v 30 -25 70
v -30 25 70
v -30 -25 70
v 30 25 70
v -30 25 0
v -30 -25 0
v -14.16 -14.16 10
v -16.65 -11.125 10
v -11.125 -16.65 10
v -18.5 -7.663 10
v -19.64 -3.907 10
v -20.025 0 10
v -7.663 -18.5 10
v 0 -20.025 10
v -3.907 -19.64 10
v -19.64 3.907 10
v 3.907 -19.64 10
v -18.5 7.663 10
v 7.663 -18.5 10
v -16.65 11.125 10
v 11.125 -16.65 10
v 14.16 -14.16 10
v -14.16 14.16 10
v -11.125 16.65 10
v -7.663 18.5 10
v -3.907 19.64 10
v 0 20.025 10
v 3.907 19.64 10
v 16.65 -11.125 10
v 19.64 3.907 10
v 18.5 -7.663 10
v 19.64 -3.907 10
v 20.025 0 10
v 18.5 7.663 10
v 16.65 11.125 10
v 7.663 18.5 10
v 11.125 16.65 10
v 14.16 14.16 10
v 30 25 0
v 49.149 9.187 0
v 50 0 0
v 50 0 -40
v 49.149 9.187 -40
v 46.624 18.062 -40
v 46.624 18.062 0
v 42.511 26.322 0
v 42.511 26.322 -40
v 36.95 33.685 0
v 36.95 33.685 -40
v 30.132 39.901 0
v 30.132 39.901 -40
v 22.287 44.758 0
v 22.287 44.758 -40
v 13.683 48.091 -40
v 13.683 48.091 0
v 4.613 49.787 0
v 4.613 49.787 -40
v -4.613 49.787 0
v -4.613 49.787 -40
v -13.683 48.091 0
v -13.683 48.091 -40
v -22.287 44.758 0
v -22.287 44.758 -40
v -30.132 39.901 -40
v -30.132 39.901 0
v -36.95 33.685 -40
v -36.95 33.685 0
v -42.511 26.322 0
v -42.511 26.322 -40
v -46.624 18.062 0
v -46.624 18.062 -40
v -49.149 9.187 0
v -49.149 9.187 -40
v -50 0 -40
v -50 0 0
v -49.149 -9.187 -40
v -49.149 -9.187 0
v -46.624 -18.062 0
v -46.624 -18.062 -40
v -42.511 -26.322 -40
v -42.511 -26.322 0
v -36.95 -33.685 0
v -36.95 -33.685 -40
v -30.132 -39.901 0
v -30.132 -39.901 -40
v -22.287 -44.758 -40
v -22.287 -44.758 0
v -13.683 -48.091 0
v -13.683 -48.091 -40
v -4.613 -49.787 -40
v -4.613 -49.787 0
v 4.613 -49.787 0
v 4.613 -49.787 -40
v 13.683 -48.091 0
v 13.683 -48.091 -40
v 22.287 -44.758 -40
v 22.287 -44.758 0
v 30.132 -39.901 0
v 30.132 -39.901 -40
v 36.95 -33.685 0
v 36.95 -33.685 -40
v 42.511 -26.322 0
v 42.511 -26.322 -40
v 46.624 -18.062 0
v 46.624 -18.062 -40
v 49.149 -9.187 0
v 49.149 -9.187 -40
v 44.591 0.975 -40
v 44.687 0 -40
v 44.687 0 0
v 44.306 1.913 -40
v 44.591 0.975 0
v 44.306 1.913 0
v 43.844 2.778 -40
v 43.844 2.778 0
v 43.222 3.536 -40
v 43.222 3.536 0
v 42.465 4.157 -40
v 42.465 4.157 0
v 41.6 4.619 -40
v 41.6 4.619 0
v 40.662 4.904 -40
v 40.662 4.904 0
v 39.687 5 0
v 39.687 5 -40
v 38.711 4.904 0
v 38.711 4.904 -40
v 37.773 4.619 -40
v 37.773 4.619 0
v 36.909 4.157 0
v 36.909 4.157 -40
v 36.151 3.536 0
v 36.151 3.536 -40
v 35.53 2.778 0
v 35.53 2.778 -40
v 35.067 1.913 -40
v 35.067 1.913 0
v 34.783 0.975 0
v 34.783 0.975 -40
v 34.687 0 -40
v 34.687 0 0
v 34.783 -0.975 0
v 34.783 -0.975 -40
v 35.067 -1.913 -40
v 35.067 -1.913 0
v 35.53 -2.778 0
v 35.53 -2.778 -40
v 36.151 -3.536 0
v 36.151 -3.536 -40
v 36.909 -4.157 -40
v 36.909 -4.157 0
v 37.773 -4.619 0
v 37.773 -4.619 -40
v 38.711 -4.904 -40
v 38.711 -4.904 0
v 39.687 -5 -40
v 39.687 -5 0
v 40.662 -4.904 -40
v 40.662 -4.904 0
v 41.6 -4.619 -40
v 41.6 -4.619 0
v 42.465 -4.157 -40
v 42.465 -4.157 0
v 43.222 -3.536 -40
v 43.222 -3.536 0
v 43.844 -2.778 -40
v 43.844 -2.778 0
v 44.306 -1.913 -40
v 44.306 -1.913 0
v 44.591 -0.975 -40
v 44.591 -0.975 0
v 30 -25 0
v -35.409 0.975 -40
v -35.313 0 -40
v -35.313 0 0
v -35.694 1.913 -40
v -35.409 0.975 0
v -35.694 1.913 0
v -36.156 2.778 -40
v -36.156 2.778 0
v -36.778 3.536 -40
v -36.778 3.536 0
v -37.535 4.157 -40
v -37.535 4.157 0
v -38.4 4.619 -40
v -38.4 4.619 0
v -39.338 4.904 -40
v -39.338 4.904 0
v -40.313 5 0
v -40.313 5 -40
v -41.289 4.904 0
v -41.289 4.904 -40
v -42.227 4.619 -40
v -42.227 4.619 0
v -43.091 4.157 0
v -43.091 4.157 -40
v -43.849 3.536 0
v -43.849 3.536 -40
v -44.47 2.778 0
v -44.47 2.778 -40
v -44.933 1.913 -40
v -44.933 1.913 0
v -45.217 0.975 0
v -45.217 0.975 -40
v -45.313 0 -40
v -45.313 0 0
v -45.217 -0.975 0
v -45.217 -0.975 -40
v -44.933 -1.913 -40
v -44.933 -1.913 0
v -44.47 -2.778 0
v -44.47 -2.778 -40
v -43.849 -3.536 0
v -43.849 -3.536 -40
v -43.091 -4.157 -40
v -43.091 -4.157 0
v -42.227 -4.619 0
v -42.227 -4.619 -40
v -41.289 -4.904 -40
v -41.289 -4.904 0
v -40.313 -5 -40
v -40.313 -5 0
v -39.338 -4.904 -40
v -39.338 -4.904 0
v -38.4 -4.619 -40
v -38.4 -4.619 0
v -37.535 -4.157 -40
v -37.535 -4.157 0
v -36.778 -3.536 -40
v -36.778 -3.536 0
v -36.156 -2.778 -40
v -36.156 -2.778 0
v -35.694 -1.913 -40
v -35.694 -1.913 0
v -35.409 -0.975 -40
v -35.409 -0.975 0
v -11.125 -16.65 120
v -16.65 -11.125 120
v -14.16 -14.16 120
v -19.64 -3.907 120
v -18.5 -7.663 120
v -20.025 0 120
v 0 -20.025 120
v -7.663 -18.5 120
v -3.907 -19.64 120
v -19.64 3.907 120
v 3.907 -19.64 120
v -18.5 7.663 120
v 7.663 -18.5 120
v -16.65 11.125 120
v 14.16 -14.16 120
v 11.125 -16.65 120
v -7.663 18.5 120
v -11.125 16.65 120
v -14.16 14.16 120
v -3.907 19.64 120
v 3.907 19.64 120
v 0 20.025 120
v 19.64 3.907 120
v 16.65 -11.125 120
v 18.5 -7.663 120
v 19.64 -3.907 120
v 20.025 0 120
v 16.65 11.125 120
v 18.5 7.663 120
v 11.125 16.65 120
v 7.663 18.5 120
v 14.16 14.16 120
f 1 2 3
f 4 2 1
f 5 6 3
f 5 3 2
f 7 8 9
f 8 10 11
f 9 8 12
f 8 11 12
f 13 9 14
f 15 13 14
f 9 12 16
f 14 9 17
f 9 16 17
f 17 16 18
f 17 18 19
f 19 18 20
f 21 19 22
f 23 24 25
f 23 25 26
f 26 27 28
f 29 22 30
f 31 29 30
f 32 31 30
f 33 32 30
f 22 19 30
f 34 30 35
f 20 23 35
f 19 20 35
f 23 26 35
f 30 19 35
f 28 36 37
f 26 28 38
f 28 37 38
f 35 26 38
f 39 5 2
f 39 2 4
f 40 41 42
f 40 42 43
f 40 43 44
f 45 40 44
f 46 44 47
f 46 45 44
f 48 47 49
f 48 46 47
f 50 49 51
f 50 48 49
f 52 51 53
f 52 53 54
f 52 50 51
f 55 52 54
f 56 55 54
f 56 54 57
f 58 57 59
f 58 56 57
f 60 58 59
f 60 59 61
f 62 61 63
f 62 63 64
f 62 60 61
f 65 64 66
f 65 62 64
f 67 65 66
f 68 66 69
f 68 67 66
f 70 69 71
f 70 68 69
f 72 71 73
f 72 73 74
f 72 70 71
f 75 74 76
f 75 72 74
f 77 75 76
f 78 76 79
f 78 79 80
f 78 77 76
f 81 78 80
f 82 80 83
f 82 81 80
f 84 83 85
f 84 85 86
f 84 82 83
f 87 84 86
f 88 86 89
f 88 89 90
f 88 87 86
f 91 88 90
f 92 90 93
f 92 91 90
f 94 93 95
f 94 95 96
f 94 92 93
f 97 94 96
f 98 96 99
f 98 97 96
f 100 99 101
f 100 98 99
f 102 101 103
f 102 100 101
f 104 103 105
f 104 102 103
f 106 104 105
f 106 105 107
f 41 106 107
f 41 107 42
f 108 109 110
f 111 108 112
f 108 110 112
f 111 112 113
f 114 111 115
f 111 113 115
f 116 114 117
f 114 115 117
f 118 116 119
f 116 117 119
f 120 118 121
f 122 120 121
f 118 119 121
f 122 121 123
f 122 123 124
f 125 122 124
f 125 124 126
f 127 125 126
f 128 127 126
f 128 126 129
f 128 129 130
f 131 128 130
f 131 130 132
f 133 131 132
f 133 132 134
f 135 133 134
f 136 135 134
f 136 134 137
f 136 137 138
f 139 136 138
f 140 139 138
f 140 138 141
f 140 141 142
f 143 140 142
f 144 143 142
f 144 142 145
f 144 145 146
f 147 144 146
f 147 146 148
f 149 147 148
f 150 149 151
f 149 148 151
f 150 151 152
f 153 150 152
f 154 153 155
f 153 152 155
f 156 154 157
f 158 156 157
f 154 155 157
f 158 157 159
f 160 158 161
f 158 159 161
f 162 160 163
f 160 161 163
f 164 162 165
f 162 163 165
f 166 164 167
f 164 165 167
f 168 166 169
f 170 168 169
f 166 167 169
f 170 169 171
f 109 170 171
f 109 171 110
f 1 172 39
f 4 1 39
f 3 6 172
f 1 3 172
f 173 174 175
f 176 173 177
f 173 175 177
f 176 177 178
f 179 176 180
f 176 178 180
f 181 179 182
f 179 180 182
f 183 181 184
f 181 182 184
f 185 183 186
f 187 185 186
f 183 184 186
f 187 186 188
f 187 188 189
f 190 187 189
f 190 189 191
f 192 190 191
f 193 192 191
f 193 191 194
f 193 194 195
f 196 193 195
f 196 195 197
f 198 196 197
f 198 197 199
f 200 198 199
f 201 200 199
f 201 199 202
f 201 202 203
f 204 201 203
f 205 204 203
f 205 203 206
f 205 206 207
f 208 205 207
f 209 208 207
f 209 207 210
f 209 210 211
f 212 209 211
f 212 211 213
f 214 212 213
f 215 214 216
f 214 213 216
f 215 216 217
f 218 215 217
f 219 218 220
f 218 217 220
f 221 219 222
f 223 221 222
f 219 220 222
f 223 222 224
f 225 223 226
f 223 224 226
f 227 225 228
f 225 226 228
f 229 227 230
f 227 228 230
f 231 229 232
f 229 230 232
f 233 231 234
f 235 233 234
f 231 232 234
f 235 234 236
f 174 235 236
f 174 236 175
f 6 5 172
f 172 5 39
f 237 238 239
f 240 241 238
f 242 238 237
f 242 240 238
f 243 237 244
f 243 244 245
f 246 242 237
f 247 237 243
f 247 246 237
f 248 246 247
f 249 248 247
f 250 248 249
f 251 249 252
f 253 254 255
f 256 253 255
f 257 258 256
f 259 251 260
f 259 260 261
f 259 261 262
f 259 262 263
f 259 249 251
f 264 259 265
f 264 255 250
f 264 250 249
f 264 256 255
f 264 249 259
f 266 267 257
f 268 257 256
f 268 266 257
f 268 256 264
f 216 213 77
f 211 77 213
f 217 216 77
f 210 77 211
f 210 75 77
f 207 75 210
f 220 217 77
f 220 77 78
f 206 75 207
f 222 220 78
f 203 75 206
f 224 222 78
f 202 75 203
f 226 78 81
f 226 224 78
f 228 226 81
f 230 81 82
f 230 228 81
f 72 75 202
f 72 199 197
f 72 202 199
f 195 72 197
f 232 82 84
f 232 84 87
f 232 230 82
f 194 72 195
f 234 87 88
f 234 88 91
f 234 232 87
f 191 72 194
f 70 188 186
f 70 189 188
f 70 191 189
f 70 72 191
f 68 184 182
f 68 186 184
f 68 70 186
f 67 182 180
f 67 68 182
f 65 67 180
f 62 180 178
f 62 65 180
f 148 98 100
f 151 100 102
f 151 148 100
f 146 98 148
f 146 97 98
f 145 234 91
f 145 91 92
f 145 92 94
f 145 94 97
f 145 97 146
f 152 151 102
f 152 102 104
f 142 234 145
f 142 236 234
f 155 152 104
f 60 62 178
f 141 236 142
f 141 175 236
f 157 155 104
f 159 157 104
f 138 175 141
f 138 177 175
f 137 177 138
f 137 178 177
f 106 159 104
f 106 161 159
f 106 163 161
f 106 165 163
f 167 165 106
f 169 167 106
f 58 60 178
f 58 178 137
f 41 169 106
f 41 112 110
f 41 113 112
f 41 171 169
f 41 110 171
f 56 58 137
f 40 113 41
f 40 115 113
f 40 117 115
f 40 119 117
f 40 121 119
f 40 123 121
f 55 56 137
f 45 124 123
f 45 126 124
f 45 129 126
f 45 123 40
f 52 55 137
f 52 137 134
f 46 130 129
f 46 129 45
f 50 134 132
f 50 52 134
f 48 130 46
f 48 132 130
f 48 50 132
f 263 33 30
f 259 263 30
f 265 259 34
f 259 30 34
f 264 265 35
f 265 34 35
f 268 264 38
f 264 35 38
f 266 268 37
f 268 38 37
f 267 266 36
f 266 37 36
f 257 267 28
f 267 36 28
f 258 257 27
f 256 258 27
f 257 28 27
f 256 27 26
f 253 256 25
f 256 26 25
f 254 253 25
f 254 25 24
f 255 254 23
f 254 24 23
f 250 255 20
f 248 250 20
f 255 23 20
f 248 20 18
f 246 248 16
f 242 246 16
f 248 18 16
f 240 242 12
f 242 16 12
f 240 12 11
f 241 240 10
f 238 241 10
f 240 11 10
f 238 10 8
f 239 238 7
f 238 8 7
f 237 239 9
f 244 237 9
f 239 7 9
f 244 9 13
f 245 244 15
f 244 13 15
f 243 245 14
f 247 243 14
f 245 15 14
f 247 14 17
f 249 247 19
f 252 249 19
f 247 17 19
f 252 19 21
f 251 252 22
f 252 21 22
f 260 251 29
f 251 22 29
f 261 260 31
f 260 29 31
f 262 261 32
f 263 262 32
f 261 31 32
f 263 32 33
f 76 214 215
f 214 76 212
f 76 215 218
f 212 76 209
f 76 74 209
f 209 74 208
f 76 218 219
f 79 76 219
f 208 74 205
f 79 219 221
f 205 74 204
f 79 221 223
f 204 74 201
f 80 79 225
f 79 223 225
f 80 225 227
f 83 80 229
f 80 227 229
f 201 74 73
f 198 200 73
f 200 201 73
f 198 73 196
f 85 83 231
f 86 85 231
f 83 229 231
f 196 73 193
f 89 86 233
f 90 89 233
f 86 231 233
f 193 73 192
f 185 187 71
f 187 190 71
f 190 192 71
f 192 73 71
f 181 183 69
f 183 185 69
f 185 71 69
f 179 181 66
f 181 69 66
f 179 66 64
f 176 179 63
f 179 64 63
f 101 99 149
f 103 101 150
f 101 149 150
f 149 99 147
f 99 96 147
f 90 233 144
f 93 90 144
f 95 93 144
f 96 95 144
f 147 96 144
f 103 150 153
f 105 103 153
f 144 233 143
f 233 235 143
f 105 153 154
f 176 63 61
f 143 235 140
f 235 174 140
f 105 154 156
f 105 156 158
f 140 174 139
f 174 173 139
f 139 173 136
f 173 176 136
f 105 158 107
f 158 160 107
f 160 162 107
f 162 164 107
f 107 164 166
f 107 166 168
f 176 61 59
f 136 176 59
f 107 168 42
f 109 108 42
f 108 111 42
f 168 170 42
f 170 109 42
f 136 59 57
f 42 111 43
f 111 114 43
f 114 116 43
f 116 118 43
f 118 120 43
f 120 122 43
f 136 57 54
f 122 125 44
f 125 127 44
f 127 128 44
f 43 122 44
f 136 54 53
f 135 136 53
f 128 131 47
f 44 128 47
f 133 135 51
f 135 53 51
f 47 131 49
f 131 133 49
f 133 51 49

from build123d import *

# Parameters (mm, degrees)
SKETCH001_R       = 50
PAD_DEPTH         = 40
SKETCH004_R       = 5
POCKET_DEPTH      = 0.001
POCKET_DEPTH_BACK = 40.001
SKETCH002_W       = 60
SKETCH002_H       = 50
PAD001_DEPTH      = 70
PAD002_START      = 10
SKETCH003_R       = 20.024728
PAD002_DEPTH      = 110


with BuildPart() as bottom:
    # Sketch001 (on Sketch) → Pad (new body)
    with BuildSketch(Plane.XY):
        Circle(SKETCH001_R)
    extrude(amount=-PAD_DEPTH)

    # Sketch004 → Pocket (cut, two sides)
    with BuildSketch(Plane.XY) as pocket_sk:
        with Locations((-40.313147, 0)):
            Circle(SKETCH004_R)
        with Locations((39.686853, 0)):
            Circle(SKETCH004_R)
    extrude(amount=POCKET_DEPTH, mode=Mode.SUBTRACT)
    extrude(pocket_sk.sketch, amount=-POCKET_DEPTH_BACK, mode=Mode.SUBTRACT)


with BuildPart() as body:
    # Sketch002 → Pad001 (new body)
    with BuildSketch(Plane.XY):
        Rectangle(SKETCH002_W, SKETCH002_H)
    extrude(amount=PAD001_DEPTH)


with BuildPart() as top:
    # Sketch003 → Pad002 (new body)
    with BuildSketch(Plane.XY.offset(PAD002_START)):
        Circle(SKETCH003_R)
    extrude(amount=PAD002_DEPTH)


solid = Compound([bottom.part, body.part, top.part])
